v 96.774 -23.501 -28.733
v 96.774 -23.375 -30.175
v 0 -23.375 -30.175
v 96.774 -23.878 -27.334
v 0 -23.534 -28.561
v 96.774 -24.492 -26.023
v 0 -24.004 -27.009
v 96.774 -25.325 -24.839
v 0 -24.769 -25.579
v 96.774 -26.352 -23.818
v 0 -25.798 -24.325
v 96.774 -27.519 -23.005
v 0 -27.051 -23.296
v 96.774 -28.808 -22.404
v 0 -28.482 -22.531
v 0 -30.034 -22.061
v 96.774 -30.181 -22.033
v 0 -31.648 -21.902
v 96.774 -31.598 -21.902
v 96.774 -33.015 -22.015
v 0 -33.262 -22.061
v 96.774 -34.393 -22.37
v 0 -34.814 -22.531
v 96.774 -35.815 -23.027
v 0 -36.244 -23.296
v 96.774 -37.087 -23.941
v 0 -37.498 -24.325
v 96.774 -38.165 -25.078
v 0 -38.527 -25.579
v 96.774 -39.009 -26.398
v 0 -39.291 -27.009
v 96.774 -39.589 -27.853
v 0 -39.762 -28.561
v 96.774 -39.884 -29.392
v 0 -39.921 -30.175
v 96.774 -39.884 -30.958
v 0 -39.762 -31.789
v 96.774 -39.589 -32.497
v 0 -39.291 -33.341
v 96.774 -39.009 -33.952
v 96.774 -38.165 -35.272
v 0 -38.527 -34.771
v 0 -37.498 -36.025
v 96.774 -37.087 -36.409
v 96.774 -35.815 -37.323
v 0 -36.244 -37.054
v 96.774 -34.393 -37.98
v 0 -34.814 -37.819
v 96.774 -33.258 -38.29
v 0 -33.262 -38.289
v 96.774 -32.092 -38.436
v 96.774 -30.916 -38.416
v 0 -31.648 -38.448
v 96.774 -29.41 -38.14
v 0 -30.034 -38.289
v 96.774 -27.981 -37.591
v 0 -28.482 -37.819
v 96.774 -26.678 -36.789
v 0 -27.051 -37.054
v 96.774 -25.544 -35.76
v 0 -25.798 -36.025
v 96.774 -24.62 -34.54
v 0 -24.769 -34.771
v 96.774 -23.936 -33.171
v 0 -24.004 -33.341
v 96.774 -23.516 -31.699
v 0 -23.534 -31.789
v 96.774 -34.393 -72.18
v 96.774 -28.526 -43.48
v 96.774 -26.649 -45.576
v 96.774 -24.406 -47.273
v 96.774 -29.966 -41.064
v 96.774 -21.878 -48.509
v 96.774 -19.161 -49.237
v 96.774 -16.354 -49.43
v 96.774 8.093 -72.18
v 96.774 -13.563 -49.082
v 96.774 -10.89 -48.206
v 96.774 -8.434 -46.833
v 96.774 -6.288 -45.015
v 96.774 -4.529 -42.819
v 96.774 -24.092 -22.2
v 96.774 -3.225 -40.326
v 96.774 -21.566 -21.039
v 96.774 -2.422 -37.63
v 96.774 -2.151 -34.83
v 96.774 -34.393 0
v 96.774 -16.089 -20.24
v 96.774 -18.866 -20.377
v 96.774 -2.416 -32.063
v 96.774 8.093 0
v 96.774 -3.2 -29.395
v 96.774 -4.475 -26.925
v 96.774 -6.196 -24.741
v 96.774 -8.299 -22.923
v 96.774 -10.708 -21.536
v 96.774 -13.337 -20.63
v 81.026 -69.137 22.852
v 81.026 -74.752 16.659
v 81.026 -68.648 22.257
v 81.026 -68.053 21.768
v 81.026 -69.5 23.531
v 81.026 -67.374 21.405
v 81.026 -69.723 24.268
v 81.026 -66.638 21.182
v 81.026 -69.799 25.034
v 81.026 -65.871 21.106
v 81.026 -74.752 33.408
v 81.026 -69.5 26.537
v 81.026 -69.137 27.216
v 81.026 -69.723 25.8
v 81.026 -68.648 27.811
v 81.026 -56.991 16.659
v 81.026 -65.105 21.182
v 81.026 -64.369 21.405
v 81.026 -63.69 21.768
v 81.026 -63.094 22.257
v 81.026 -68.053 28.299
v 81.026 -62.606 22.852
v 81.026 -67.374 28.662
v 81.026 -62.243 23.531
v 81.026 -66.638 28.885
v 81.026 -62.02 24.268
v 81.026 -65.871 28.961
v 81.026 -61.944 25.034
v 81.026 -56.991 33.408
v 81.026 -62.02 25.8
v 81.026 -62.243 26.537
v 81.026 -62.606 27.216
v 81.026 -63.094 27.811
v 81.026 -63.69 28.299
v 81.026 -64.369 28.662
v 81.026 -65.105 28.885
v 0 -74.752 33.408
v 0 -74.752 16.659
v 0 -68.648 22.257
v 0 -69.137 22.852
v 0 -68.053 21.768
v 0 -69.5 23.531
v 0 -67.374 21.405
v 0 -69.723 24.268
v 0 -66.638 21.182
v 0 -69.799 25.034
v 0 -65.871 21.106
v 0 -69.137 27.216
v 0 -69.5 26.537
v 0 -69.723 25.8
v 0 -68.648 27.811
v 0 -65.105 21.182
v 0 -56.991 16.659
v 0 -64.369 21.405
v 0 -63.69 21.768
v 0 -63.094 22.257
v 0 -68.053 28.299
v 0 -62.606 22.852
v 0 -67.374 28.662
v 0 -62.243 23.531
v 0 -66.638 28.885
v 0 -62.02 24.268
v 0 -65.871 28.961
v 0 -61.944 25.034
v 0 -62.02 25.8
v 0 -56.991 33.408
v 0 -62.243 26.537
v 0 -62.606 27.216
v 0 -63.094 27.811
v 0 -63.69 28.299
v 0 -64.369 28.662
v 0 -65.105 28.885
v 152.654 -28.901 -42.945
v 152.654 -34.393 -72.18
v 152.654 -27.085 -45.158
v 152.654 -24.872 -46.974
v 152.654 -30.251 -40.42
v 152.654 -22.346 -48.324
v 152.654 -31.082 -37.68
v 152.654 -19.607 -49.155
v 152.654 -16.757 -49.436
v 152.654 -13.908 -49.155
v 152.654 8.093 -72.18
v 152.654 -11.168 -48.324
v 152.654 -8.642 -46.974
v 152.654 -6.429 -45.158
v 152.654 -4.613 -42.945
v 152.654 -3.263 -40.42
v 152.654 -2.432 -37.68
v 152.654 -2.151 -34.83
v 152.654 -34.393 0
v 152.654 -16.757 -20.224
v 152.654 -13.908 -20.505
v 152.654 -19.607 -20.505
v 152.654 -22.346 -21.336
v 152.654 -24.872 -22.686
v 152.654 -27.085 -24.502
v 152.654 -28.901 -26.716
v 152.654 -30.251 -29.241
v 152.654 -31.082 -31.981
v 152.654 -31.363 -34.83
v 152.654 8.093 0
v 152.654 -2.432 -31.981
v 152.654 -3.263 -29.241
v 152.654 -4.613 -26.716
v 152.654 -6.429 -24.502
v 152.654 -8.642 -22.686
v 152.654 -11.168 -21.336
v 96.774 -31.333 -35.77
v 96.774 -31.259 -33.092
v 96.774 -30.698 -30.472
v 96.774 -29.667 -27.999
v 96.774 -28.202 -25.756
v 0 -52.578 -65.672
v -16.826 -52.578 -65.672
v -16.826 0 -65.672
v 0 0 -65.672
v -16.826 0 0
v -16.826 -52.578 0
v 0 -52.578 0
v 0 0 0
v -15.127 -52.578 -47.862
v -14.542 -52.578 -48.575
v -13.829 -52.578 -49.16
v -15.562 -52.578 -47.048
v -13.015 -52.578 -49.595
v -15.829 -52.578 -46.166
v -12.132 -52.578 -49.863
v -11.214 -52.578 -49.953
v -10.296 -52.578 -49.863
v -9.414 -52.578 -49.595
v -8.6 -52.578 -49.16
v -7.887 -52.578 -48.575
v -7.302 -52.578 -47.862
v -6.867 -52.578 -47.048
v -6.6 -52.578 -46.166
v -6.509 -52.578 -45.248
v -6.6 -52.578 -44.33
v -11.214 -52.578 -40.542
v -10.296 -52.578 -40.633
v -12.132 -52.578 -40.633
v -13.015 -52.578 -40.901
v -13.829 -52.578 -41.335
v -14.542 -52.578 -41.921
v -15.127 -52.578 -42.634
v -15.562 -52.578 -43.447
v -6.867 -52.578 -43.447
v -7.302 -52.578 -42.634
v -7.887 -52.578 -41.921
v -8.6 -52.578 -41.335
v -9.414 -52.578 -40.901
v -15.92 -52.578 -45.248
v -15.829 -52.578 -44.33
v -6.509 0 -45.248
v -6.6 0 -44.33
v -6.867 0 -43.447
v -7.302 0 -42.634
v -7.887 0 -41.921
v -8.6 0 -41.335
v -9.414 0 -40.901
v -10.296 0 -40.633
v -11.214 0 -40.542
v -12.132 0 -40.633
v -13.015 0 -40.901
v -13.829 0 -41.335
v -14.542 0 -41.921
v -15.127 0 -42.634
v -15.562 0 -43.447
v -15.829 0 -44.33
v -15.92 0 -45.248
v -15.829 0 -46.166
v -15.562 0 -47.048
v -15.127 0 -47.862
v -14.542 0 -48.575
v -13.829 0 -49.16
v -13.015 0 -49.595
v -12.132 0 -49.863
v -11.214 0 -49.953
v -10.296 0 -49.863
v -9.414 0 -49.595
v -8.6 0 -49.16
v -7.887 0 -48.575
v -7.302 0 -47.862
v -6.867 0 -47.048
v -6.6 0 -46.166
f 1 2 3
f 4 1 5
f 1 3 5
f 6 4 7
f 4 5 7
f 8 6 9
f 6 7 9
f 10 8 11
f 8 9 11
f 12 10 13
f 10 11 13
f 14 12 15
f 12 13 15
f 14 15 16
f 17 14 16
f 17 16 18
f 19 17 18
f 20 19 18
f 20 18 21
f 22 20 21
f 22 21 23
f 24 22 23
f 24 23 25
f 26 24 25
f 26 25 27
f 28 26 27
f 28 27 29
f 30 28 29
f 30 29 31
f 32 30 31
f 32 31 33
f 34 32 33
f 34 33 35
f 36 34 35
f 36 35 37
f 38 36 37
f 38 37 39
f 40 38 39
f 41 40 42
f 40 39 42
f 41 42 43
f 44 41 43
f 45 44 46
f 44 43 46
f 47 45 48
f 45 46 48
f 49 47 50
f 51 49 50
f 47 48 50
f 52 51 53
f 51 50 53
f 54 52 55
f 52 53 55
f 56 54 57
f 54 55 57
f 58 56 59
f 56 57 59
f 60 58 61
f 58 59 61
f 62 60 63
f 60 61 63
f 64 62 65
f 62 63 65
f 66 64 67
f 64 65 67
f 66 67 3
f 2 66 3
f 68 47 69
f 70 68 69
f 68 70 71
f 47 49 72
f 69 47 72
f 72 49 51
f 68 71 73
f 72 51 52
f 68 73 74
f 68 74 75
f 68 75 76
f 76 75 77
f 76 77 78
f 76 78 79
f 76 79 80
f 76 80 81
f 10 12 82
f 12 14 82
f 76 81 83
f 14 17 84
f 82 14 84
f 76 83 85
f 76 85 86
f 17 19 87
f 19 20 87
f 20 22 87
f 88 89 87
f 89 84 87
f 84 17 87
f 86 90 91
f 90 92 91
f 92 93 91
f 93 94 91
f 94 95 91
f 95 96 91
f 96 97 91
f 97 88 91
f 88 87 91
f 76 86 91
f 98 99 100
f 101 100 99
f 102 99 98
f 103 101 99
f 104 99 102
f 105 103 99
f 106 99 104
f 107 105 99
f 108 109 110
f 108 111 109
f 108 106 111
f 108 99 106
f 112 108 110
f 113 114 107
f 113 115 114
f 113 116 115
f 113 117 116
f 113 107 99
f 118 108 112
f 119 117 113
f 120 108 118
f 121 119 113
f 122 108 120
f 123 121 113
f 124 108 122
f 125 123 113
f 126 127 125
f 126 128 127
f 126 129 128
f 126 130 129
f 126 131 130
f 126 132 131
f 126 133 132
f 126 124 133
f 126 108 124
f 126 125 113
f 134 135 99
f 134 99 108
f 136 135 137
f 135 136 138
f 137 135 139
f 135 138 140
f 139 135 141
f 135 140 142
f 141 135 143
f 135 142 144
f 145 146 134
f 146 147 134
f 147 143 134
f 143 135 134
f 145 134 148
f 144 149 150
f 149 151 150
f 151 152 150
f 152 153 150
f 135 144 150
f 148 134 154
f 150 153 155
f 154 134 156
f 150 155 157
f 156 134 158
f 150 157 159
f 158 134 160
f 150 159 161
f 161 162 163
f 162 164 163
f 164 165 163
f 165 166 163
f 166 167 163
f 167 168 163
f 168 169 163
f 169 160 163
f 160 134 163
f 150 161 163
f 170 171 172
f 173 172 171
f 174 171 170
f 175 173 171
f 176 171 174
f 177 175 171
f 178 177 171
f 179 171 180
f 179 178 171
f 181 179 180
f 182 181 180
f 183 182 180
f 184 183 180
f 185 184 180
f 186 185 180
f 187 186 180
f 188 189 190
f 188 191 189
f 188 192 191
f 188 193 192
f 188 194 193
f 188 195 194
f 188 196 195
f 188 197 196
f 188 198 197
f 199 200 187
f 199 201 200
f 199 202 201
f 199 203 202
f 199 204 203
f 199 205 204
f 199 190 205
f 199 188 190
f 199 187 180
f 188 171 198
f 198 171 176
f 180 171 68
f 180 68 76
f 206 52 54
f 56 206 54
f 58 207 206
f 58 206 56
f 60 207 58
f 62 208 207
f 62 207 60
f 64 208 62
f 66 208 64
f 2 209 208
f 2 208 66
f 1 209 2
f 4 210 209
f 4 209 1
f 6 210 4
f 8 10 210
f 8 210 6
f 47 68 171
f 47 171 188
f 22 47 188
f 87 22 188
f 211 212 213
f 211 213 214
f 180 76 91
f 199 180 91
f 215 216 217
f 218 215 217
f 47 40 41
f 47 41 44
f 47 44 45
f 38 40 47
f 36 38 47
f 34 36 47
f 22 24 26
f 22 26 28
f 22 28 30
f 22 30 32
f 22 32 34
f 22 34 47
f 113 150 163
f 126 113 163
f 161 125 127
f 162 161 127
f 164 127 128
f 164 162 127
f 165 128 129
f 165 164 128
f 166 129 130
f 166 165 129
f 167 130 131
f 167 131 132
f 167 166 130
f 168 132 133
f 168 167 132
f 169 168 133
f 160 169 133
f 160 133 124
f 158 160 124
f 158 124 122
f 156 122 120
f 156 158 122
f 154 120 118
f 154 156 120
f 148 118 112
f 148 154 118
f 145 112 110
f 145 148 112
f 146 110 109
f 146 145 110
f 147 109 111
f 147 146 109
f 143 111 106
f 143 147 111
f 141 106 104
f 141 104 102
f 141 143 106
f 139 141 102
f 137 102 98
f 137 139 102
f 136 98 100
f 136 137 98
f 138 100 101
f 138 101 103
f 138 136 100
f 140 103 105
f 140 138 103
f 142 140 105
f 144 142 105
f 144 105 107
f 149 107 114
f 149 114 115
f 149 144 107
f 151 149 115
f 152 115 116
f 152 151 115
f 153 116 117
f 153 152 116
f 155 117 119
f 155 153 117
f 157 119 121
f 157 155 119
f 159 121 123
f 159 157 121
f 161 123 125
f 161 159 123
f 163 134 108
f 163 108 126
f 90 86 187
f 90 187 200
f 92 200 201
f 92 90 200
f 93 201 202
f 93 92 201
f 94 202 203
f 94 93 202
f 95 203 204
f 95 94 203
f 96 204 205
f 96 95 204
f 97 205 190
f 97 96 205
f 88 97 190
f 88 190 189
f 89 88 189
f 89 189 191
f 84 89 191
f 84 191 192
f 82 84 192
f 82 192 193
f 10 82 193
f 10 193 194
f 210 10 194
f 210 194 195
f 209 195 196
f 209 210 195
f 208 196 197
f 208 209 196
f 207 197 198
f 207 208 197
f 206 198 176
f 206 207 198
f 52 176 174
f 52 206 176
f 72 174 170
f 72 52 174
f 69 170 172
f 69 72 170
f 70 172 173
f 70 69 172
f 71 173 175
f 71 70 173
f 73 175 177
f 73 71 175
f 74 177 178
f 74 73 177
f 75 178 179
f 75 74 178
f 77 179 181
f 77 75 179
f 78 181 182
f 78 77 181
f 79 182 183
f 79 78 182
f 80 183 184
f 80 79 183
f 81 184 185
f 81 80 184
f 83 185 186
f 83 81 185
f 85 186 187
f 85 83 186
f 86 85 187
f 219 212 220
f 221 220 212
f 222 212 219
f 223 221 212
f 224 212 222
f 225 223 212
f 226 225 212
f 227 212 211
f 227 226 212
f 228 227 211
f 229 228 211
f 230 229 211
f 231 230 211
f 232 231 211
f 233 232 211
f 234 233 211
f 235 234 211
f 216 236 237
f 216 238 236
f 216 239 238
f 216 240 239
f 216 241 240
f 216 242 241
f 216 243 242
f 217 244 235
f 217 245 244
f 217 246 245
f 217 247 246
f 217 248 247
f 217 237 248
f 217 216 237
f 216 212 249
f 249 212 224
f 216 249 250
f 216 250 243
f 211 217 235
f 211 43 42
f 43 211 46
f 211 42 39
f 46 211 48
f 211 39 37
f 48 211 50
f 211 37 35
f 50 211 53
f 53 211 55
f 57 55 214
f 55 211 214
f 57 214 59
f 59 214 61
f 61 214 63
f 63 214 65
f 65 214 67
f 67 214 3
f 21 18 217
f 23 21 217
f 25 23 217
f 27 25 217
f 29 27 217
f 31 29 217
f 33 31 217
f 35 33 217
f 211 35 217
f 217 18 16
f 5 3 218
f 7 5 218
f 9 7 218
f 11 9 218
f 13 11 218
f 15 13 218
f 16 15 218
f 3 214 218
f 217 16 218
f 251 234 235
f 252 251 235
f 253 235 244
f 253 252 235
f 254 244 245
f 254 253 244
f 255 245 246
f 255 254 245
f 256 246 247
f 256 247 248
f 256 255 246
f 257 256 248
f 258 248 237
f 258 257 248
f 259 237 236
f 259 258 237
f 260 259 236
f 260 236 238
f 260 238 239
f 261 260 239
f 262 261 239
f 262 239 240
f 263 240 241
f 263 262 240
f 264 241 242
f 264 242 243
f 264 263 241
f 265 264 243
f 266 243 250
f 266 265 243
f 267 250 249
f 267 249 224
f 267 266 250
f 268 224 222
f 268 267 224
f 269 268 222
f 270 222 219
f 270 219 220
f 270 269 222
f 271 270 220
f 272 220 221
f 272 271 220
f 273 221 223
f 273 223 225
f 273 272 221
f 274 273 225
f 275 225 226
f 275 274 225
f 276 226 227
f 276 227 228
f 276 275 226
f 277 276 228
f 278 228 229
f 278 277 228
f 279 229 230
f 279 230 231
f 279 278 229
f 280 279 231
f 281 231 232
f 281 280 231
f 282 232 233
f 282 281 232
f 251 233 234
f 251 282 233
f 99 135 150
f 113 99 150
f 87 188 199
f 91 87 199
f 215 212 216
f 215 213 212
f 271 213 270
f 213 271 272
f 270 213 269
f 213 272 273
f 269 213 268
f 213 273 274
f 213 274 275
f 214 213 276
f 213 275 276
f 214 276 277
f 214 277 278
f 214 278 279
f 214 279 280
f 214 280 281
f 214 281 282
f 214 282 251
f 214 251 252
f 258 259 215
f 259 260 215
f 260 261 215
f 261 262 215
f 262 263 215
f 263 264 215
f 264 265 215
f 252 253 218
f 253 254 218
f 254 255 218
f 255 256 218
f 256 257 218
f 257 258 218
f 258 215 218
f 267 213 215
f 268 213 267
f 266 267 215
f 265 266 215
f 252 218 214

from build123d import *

# Parameters (mm, degrees)
F1_W      = 17.7617222071
F1_H      = 16.7483836412
F1_R      = 3.9272334966
F2_DEPTH  = 81.026
F3_W      = 16.8257057667
F3_H      = 65.6720995903
F3_R      = 4.7053245115
F4_DEPTH  = 25.4
F5_W      = 16.8257057667
F5_H      = 65.6720995903
F5_R      = 4.7053245115
F5_R_2    = 3.4049963351
F6_DEPTH  = 1.778
F9_DEPTH  = 25.4
F12_R     = 8.2733352579
F13_DEPTH = 96.774
F14_W     = 42.485463433
F14_H     = 72.1800103784
F14_R     = 14.6058574256
F15_DEPTH = 55.88


# Not quite as in the source:
# - the program builds the solid bodies; features that only make, move or delete a surface that nothing else refers to are left out


with BuildPart() as f2:
    # F1 (on Right) → F2 (new body)
    with BuildSketch(Plane.YZ):
        with Locations((-65.8714547753, 25.0336769968)):
            Rectangle(F1_W, F1_H)
        with Locations((-65.8714547753, 25.0336769968)):
            Circle(F1_R, mode=Mode.SUBTRACT)
    extrude(amount=F2_DEPTH)


with BuildPart() as f4:
    # F3 (on Front) → F4 (new body)
    with BuildSketch(Plane.XZ):
        with Locations((-8.4128528833, -32.8360497952)):
            Rectangle(F3_W, F3_H)
        with Locations((-11.2144201994, -45.2477447689)):
            Circle(F3_R, mode=Mode.SUBTRACT)
    extrude(amount=F4_DEPTH)

    # F5 (on face) → F6 (join)
    with BuildSketch(Plane.XZ.offset(25.4)):
        with Locations((-8.4128528833, -32.8360497952)):
            Rectangle(F5_W, F5_H)
        with Locations((-11.2144201994, -45.2477447689)):
            Circle(F5_R, mode=Mode.SUBTRACT)
        with Locations((-11.8808113039, -30.071657151)):
            Circle(F5_R_2, mode=Mode.SUBTRACT)
        with Locations((-11.8808113039, -30.071657151)):
            Circle(F5_R_2)
    extrude(amount=F6_DEPTH)

    # F9 (add): a face of the model
    f9_faces = [f4.faces().sort_by_distance(p)[0] for p in [
        (-8.2246562992, -27.178, -32.0022884273),
    ]]
    extrude(f9_faces, amount=F9_DEPTH)

    # F12 (on face) → F13 (join)
    with BuildSketch(Plane.YZ):
        with Locations((-31.6479168832, -30.1750041544)):
            Circle(F12_R)
    extrude(amount=F13_DEPTH)

    # F14 (on face) → F15 (join)
    with BuildSketch(Plane.YZ.offset(96.774)):
        with Locations((-13.1497965194, -36.0900051892)):
            Rectangle(F14_W, F14_H)
        with Locations((-16.7570486665, -34.8301380873)):
            Circle(F14_R, mode=Mode.SUBTRACT)
    extrude(amount=F15_DEPTH)


solid = Compound([f2.part, f4.part])
